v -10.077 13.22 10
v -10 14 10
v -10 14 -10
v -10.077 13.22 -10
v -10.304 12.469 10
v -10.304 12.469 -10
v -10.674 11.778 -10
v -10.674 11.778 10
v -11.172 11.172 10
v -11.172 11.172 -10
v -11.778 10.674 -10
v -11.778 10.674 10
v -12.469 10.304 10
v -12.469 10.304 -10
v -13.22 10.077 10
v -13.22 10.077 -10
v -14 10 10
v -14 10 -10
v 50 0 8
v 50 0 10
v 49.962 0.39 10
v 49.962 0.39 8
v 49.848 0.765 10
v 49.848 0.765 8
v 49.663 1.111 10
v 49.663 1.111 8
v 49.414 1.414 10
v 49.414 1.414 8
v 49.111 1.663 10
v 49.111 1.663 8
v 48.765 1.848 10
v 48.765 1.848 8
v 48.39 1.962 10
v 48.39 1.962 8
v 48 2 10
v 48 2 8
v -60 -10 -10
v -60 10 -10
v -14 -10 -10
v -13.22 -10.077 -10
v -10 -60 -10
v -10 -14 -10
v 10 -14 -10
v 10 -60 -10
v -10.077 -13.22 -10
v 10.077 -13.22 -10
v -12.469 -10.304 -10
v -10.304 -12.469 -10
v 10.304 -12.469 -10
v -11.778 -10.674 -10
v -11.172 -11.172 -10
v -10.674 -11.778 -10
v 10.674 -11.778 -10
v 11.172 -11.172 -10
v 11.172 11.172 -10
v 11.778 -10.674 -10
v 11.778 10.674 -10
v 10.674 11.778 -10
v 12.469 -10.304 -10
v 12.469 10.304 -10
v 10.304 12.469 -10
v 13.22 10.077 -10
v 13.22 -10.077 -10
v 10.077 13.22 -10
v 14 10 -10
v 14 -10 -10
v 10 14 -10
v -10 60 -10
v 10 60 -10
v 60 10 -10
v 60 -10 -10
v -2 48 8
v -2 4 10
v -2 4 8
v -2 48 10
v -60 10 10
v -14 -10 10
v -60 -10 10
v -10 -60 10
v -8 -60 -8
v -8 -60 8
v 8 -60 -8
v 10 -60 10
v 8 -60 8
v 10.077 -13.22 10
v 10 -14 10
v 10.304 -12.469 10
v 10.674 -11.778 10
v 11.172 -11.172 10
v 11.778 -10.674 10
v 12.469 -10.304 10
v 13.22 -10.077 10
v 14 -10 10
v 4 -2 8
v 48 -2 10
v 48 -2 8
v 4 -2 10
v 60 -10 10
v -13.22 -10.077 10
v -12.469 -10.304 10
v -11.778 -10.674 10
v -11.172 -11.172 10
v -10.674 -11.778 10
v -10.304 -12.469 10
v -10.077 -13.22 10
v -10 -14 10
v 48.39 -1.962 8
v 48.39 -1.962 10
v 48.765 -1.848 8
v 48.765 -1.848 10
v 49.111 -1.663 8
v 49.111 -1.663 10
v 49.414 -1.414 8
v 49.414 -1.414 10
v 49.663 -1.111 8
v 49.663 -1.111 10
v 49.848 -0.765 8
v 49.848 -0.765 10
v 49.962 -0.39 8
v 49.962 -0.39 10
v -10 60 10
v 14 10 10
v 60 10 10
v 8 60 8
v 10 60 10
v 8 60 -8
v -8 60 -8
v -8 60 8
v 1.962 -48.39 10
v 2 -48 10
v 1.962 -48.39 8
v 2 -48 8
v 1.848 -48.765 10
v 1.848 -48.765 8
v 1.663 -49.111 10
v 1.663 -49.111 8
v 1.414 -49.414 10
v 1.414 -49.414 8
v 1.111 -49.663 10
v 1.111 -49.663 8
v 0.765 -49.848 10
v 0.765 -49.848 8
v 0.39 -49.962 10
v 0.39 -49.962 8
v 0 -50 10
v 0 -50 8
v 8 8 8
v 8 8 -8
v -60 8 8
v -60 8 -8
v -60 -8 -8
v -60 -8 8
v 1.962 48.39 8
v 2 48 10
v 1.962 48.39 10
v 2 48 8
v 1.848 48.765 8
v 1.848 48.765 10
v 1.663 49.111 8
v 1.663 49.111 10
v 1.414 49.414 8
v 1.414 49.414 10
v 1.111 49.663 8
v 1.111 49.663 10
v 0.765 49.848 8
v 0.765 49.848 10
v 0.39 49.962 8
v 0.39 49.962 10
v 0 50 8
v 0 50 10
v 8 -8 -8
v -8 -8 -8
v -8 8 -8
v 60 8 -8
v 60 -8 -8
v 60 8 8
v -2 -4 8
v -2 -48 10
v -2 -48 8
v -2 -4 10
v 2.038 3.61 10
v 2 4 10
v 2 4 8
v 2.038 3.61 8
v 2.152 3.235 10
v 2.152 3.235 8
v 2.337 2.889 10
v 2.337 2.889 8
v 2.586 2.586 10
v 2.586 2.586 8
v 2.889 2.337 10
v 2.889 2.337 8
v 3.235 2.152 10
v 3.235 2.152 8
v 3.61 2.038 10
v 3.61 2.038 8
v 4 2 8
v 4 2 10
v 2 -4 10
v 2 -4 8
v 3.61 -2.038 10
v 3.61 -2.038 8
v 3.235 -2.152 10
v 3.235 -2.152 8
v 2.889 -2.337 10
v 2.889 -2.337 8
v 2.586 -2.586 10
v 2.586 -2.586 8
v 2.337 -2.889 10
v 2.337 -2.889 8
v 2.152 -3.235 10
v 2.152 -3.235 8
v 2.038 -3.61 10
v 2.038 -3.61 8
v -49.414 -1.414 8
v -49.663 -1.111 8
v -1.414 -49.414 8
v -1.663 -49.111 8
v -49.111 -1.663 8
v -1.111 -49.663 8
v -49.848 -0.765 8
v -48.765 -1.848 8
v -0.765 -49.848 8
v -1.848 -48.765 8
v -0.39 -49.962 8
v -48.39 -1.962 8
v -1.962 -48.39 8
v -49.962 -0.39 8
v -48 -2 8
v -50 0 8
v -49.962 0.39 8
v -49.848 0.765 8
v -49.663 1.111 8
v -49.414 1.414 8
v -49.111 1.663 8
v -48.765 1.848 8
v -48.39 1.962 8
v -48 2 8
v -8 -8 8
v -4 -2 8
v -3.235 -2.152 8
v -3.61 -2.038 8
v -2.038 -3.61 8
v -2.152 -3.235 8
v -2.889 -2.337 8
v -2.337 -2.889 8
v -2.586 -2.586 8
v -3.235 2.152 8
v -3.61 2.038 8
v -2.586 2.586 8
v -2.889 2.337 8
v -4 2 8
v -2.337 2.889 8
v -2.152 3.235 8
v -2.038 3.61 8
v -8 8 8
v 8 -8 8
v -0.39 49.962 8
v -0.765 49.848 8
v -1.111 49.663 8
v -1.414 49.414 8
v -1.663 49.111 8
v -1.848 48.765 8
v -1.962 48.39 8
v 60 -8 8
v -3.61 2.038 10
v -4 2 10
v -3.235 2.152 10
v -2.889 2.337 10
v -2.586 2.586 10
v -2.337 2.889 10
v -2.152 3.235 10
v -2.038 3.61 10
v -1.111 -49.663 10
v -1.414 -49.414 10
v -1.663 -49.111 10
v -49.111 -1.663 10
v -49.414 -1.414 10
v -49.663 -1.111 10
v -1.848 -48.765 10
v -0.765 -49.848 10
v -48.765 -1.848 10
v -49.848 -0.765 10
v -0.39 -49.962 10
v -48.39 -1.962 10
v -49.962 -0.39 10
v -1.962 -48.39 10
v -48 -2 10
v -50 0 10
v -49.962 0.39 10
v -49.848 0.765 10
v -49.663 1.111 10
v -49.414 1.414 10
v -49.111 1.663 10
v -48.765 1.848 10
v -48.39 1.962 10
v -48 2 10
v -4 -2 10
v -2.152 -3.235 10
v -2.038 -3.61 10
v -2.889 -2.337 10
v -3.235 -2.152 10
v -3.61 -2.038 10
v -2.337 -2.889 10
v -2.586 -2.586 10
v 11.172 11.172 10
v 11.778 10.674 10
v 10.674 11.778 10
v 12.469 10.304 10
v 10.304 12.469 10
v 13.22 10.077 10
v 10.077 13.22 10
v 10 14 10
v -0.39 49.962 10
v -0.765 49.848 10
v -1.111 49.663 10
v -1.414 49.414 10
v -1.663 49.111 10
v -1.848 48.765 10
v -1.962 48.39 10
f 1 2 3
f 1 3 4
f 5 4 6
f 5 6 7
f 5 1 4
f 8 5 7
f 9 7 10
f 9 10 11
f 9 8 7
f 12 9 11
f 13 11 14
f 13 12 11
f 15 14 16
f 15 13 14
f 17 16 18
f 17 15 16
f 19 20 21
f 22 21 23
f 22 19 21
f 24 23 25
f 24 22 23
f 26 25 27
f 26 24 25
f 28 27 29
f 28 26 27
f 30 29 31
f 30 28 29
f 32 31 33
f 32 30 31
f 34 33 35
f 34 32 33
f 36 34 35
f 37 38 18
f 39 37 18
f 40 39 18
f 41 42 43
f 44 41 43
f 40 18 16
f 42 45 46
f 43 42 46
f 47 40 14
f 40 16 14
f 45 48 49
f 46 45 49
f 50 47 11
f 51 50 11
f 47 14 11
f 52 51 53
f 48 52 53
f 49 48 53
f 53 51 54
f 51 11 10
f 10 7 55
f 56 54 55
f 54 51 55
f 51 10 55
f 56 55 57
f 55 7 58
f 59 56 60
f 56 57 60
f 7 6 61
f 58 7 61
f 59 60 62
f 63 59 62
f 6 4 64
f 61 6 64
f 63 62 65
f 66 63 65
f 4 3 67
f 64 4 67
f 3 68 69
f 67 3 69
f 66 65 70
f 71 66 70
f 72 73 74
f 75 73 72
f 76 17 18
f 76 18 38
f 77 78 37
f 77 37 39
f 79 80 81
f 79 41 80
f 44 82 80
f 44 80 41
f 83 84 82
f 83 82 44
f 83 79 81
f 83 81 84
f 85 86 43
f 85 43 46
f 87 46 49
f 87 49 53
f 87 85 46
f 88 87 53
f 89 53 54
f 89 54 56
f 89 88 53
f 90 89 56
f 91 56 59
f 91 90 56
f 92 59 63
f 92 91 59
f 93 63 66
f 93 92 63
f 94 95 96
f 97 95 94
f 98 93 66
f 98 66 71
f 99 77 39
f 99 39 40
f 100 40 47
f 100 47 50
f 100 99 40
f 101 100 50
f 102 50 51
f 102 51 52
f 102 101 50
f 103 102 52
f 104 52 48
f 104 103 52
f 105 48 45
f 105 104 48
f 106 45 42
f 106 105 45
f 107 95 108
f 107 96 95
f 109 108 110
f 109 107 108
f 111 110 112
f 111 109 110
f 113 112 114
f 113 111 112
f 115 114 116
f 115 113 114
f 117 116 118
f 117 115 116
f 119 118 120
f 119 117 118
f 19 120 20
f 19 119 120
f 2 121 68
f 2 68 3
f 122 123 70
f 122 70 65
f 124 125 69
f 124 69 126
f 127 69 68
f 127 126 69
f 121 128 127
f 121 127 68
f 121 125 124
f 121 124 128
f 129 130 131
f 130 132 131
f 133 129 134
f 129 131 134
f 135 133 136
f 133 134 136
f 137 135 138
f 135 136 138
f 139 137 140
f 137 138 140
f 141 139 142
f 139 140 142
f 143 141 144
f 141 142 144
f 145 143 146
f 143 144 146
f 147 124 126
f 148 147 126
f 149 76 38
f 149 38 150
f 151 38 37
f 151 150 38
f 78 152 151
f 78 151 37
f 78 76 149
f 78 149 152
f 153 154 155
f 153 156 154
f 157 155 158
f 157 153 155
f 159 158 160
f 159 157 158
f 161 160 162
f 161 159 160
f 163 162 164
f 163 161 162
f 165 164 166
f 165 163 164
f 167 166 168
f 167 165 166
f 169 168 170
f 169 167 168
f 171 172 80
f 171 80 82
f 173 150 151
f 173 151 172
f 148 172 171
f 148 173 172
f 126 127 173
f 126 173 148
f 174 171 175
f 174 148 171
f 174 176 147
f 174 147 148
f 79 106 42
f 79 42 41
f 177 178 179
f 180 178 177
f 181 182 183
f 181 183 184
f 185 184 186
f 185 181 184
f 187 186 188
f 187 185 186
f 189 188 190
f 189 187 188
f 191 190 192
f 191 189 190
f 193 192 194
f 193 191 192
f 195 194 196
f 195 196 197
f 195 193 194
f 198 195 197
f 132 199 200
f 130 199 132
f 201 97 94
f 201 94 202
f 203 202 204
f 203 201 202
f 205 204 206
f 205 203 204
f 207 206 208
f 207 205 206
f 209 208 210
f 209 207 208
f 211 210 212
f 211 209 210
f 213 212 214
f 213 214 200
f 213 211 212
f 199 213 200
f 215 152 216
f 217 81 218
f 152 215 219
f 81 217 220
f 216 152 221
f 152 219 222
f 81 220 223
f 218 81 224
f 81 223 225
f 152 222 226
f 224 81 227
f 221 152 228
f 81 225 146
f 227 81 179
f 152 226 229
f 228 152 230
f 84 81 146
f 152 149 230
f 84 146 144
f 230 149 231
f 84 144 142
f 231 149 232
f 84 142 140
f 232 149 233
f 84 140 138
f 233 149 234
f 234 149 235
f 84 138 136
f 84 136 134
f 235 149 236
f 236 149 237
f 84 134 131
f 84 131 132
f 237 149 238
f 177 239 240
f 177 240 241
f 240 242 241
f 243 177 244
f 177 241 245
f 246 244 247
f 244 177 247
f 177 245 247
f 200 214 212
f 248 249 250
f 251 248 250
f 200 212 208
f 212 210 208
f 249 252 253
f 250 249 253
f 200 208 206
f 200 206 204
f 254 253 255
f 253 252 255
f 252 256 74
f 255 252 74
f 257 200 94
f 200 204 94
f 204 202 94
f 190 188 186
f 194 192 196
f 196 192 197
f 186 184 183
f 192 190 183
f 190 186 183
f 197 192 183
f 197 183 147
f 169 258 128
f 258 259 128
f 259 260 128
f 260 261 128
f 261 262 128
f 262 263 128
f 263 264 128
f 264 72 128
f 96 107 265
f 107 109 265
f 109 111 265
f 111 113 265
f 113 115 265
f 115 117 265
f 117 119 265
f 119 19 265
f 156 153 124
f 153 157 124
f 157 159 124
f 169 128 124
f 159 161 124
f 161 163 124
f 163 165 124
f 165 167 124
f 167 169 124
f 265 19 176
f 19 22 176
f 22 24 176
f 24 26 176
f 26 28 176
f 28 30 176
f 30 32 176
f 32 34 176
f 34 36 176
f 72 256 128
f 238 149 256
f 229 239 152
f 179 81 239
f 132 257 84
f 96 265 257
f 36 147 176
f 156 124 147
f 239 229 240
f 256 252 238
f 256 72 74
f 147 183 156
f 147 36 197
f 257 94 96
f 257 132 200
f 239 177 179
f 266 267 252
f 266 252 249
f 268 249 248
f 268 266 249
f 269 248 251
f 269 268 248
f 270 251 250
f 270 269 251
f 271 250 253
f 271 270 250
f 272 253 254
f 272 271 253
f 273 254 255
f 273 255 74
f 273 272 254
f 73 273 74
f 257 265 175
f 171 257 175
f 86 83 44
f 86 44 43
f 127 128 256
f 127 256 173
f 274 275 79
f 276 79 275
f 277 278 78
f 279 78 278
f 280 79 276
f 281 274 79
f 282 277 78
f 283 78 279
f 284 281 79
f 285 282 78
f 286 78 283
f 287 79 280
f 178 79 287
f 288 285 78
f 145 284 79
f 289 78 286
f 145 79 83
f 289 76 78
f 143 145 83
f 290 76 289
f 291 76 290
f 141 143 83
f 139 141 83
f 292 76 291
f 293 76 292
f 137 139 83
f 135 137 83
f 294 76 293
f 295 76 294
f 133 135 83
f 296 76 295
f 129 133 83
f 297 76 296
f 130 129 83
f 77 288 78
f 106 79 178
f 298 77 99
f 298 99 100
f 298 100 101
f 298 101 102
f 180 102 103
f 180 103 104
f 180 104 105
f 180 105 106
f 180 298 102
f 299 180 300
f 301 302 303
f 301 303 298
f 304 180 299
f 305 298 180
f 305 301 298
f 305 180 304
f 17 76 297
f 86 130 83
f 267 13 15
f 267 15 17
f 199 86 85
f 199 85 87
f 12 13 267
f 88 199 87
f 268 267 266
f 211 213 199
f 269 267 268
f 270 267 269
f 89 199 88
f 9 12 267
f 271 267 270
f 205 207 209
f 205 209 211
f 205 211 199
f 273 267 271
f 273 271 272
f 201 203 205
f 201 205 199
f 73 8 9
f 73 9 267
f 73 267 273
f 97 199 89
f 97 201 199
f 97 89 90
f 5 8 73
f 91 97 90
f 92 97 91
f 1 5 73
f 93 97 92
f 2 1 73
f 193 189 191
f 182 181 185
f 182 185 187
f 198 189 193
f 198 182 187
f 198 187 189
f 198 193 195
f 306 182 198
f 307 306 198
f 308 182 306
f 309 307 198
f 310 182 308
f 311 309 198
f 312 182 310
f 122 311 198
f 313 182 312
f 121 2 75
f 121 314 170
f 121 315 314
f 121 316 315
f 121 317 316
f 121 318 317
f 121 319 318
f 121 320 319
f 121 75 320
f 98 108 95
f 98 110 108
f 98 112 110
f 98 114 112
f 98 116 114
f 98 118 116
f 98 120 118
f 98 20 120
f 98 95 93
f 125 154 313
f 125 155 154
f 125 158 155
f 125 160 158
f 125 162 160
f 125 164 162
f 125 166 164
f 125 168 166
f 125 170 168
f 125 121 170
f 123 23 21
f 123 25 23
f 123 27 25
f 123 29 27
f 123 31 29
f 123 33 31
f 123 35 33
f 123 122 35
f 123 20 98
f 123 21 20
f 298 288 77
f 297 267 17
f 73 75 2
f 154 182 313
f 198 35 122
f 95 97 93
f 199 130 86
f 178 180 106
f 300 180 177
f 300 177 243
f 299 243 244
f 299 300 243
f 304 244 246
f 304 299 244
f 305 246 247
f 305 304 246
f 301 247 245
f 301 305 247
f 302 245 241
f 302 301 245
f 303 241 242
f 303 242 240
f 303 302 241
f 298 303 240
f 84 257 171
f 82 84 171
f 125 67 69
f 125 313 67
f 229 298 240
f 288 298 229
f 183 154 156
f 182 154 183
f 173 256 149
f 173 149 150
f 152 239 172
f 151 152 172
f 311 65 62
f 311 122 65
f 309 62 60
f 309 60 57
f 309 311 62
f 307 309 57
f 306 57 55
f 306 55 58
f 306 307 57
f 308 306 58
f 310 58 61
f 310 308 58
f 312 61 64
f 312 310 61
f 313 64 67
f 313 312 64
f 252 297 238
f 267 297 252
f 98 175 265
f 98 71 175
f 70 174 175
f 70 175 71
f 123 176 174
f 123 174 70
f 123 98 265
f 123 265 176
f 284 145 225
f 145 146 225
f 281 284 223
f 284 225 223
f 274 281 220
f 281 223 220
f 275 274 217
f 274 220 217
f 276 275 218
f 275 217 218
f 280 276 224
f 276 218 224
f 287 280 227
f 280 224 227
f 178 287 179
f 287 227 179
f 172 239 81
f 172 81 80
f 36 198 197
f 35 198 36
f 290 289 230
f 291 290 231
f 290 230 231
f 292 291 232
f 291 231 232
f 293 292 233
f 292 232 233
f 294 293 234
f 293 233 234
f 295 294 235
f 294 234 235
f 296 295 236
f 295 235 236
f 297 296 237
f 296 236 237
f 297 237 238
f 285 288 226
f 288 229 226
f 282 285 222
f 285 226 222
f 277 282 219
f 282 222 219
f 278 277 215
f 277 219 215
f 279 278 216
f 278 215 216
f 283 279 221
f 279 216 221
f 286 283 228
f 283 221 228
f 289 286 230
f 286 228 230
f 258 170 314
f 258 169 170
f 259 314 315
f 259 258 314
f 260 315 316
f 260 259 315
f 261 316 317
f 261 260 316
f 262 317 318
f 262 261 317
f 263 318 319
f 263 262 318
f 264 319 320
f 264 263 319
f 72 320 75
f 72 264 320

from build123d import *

# Parameters (mm, degrees)
BOSS_EXTRUDE1_DEPTH = 10
SKETCH5_W           = 16
SKETCH5_H           = 16
CUT_EXTRUDE1_DEPTH  = 120
CUT_EXTRUDE2_REACH  = 136.536
SKETCH3_W           = 16
SKETCH3_H           = 16
CUT_EXTRUDE3_DEPTH  = 2
FILLET1_R           = 2
FILLET2_R           = 2
FILLET3_R           = 2
FILLET4_R           = 2


with BuildPart() as part:
    # Sketch2 → Boss-Extrude1 (new, symmetric)
    with BuildSketch(Plane.XY):
        with BuildLine():
            Line((10, 60), (-10, 60))
            Line((-10, 60), (-10, 14))
            ThreePointArc((-10, 14), (-11.171572875, 11.171572875), (-14, 10))
            Line((-14, 10), (-60, 10))
            Line((-60, 10), (-60, -10))
            Line((-60, -10), (-14, -10))
            ThreePointArc((-14, -10), (-11.171572875, -11.171572875), (-10, -14))
            Line((-10, -14), (-10, -60))
            Line((-10, -60), (10, -60))
            Line((10, -60), (10, -14))
            ThreePointArc((10, -14), (11.171572875, -11.171572875), (14, -10))
            Line((14, -10), (60, -10))
            Line((60, -10), (60, 10))
            Line((60, 10), (14, 10))
            ThreePointArc((14, 10), (11.171572875, 11.171572875), (10, 14))
            Line((10, 14), (10, 60))
        make_face()
    extrude(amount=BOSS_EXTRUDE1_DEPTH, both=True)

    # Sketch5 → Cut-Extrude1 (cut)
    with BuildSketch(Plane(origin=(0, 60, 0), x_dir=(1, 0, 0), z_dir=(0, 1, 0))):
        Rectangle(SKETCH5_W, SKETCH5_H)
    extrude(amount=-CUT_EXTRUDE1_DEPTH, mode=Mode.SUBTRACT)

    # Cut-Extrude2: up to this face of the body (flat: up to its plane)
    cut_extrude2_end = Plane(part.part.faces().sort_by_distance((-60, 0, 0))[0])
    # Sketch3 → Cut-Extrude2 (cut, up to the picked face)
    with BuildSketch(Plane(origin=(60, 0, 0), x_dir=(0, 0, -1), z_dir=(1, 0, 0)), mode=Mode.PRIVATE) as cut_extrude2_sk1:
        Rectangle(SKETCH3_W, SKETCH3_H)
    cut_extrude2_tool1 = split(extrude(cut_extrude2_sk1.sketch, amount=-CUT_EXTRUDE2_REACH, mode=Mode.PRIVATE), bisect_by=cut_extrude2_end, keep=Keep.BOTH, mode=Mode.PRIVATE)
    add(cut_extrude2_tool1.solids().sort_by(Axis((60, 0, 0), (-1, 0, 0)))[0], mode=Mode.SUBTRACT)

    # Sketch6 → Cut-Extrude3 (cut)
    with BuildSketch(Plane.XY.offset(10)):
        with BuildLine():
            Line((-2, 4), (-2, 50))
            Line((-2, 50), (2, 50))
            Line((2, 50), (2, 4))
            ThreePointArc((2, 4), (2.585786438, 2.585786438), (4, 2))
            Line((4, 2), (50, 2))
            Line((50, 2), (50, -2))
            Line((50, -2), (4, -2))
            ThreePointArc((4, -2), (2.585786438, -2.585786438), (2, -4))
            Line((2, -4), (2, -50))
            Line((2, -50), (-2, -50))
            Line((-2, -50), (-2, -4))
            ThreePointArc((-2, -4), (-2.585786438, -2.585786438), (-4, -2))
            Line((-4, -2), (-50, -2))
            Line((-50, -2), (-50, 2))
            Line((-50, 2), (-4, 2))
            ThreePointArc((-4, 2), (-2.585786438, 2.585786438), (-2, 4))
        make_face()
    extrude(amount=-CUT_EXTRUDE3_DEPTH, mode=Mode.SUBTRACT)

    # Fillet1
    fillet1_edges = [part.edges().sort_by_distance(p)[0] for p in [
        (-2, 50, 9),
        (2, 50, 9),
    ]]
    fillet(fillet1_edges, radius=FILLET1_R - 0.0001)  # a hair under: the kernel refuses the full size

    # Fillet2
    fillet2_edges = [part.edges().sort_by_distance(p)[0] for p in [
        (2, -50, 9),
        (-2, -50, 9),
    ]]
    fillet(fillet2_edges, radius=FILLET2_R - 0.0001)  # a hair under: the kernel refuses the full size

    # Fillet3
    fillet3_edges = [part.edges().sort_by_distance(p)[0] for p in [
        (50, 2, 9),
        (50, -2, 9),
    ]]
    fillet(fillet3_edges, radius=FILLET3_R - 0.0001)  # a hair under: the kernel refuses the full size

    # Fillet4
    fillet4_edges = [part.edges().sort_by_distance(p)[0] for p in [
        (-50, -2, 9),
        (-50, 2, 9),
    ]]
    fillet(fillet4_edges, radius=FILLET4_R - 0.0001)  # a hair under: the kernel refuses the full size


solid = part.part
